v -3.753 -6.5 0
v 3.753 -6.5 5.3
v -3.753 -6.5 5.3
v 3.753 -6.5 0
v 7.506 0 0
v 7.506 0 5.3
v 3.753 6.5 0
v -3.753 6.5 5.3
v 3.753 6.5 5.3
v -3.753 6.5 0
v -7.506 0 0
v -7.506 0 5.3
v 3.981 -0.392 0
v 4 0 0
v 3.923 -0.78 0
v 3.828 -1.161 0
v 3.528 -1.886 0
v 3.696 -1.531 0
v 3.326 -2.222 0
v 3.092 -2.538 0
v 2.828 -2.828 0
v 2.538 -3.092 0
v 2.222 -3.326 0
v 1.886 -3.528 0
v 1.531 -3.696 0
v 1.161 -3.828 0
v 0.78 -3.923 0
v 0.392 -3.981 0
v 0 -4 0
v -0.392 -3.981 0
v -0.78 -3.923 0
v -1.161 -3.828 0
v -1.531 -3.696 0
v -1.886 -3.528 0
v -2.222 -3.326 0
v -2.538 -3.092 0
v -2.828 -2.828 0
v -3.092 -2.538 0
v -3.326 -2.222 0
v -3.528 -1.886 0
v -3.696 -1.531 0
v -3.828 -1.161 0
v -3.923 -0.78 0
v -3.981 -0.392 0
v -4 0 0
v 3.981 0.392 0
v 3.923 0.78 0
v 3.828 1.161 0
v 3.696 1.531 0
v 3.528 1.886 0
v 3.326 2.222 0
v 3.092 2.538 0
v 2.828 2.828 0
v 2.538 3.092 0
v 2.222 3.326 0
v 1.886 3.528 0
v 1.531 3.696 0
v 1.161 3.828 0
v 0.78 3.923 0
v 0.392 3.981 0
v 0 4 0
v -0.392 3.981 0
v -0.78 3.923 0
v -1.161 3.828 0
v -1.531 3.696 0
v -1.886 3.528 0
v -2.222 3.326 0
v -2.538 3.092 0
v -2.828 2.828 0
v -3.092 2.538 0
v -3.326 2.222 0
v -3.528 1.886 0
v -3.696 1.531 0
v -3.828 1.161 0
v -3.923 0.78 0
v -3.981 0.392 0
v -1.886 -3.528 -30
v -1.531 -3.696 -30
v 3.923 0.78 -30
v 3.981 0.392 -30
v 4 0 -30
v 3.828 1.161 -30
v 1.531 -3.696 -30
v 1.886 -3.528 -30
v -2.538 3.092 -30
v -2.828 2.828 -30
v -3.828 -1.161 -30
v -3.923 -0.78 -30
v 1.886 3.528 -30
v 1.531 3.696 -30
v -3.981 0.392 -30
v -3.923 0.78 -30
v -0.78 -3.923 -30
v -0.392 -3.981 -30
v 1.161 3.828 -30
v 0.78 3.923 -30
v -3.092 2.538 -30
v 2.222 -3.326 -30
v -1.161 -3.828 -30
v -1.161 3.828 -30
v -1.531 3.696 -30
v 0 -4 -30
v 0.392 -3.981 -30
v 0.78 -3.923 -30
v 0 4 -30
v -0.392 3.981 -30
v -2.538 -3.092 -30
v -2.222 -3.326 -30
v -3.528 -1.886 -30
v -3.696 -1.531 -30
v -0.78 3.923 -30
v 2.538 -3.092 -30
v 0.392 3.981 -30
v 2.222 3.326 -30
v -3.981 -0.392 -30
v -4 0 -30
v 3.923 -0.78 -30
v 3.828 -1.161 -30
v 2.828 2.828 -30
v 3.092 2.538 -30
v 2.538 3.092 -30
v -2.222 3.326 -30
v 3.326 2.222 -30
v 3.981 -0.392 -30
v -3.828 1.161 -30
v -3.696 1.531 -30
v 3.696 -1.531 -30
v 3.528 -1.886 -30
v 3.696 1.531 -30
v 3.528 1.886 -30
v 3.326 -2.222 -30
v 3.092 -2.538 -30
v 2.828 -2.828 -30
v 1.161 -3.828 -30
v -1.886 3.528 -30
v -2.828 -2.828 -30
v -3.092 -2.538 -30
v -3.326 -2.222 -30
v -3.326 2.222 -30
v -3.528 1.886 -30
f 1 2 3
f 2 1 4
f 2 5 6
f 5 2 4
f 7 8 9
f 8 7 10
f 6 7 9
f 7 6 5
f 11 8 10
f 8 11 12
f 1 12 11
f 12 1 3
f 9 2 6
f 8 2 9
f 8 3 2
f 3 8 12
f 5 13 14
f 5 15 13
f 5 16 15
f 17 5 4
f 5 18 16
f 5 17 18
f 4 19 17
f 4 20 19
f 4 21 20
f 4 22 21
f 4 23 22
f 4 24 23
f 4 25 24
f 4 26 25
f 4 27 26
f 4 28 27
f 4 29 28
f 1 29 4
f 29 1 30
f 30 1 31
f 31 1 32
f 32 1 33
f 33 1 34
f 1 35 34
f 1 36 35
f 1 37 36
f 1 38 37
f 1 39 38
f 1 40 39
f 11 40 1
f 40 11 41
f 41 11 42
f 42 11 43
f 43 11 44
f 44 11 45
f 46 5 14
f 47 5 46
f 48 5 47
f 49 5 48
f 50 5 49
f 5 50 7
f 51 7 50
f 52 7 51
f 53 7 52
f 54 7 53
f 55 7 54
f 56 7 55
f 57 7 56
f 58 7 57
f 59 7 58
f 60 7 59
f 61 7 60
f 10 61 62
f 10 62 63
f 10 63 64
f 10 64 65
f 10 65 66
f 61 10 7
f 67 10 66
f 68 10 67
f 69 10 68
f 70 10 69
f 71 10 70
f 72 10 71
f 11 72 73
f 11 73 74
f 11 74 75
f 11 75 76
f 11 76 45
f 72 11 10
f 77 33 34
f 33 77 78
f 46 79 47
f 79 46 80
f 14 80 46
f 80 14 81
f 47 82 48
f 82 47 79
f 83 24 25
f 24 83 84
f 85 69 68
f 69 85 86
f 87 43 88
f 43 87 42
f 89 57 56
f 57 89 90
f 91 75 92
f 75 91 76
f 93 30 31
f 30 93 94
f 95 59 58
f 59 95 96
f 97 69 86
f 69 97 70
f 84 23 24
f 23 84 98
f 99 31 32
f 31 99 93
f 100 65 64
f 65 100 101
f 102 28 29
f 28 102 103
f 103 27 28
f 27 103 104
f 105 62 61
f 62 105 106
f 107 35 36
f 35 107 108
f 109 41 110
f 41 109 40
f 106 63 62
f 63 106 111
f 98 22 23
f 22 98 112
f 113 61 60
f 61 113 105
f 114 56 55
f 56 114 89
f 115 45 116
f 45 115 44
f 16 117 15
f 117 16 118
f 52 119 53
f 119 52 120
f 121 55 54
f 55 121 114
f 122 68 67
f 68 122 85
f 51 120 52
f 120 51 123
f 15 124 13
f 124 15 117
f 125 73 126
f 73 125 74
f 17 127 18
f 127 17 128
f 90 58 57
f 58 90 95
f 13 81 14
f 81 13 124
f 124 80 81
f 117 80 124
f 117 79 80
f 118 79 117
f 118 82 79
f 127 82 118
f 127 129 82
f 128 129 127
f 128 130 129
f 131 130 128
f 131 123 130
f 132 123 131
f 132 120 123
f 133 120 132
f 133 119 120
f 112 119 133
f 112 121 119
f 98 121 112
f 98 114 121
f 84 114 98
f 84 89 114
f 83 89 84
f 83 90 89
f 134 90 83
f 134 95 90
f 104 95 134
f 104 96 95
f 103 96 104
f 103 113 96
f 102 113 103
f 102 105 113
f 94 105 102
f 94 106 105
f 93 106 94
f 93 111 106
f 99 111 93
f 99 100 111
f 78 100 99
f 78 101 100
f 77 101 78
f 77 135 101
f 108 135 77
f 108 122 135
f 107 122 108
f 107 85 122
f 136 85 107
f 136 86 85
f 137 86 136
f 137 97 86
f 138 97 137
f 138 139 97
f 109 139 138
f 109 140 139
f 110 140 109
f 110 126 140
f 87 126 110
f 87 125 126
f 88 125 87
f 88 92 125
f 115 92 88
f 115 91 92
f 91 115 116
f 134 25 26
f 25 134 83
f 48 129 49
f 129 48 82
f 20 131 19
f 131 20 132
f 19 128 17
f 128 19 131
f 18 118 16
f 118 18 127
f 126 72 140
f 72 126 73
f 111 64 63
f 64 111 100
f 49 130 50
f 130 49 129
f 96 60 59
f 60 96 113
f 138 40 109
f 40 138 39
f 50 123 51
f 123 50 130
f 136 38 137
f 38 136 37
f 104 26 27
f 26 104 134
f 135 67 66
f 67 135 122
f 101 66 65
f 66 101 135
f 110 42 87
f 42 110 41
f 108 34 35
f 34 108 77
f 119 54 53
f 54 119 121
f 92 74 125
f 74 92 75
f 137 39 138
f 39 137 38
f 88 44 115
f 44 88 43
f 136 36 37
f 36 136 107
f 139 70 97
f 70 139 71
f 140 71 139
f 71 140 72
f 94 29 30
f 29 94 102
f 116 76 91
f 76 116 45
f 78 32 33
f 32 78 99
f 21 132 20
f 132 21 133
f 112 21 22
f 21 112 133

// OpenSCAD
$fn = 64;

module m8_bolt() {
    union() {
        // Head: hexagon, across-flats 13mm, height 5.3mm
        cylinder(h = 5.3, r = 6.5 / cos(30), $fn = 6);

        // Shank: cylinder, diameter 8mm, length 30mm extending in -Z
        translate([0, 0, -30])
            cylinder(h = 30, r = 4);
    }
}

m8_bolt();
